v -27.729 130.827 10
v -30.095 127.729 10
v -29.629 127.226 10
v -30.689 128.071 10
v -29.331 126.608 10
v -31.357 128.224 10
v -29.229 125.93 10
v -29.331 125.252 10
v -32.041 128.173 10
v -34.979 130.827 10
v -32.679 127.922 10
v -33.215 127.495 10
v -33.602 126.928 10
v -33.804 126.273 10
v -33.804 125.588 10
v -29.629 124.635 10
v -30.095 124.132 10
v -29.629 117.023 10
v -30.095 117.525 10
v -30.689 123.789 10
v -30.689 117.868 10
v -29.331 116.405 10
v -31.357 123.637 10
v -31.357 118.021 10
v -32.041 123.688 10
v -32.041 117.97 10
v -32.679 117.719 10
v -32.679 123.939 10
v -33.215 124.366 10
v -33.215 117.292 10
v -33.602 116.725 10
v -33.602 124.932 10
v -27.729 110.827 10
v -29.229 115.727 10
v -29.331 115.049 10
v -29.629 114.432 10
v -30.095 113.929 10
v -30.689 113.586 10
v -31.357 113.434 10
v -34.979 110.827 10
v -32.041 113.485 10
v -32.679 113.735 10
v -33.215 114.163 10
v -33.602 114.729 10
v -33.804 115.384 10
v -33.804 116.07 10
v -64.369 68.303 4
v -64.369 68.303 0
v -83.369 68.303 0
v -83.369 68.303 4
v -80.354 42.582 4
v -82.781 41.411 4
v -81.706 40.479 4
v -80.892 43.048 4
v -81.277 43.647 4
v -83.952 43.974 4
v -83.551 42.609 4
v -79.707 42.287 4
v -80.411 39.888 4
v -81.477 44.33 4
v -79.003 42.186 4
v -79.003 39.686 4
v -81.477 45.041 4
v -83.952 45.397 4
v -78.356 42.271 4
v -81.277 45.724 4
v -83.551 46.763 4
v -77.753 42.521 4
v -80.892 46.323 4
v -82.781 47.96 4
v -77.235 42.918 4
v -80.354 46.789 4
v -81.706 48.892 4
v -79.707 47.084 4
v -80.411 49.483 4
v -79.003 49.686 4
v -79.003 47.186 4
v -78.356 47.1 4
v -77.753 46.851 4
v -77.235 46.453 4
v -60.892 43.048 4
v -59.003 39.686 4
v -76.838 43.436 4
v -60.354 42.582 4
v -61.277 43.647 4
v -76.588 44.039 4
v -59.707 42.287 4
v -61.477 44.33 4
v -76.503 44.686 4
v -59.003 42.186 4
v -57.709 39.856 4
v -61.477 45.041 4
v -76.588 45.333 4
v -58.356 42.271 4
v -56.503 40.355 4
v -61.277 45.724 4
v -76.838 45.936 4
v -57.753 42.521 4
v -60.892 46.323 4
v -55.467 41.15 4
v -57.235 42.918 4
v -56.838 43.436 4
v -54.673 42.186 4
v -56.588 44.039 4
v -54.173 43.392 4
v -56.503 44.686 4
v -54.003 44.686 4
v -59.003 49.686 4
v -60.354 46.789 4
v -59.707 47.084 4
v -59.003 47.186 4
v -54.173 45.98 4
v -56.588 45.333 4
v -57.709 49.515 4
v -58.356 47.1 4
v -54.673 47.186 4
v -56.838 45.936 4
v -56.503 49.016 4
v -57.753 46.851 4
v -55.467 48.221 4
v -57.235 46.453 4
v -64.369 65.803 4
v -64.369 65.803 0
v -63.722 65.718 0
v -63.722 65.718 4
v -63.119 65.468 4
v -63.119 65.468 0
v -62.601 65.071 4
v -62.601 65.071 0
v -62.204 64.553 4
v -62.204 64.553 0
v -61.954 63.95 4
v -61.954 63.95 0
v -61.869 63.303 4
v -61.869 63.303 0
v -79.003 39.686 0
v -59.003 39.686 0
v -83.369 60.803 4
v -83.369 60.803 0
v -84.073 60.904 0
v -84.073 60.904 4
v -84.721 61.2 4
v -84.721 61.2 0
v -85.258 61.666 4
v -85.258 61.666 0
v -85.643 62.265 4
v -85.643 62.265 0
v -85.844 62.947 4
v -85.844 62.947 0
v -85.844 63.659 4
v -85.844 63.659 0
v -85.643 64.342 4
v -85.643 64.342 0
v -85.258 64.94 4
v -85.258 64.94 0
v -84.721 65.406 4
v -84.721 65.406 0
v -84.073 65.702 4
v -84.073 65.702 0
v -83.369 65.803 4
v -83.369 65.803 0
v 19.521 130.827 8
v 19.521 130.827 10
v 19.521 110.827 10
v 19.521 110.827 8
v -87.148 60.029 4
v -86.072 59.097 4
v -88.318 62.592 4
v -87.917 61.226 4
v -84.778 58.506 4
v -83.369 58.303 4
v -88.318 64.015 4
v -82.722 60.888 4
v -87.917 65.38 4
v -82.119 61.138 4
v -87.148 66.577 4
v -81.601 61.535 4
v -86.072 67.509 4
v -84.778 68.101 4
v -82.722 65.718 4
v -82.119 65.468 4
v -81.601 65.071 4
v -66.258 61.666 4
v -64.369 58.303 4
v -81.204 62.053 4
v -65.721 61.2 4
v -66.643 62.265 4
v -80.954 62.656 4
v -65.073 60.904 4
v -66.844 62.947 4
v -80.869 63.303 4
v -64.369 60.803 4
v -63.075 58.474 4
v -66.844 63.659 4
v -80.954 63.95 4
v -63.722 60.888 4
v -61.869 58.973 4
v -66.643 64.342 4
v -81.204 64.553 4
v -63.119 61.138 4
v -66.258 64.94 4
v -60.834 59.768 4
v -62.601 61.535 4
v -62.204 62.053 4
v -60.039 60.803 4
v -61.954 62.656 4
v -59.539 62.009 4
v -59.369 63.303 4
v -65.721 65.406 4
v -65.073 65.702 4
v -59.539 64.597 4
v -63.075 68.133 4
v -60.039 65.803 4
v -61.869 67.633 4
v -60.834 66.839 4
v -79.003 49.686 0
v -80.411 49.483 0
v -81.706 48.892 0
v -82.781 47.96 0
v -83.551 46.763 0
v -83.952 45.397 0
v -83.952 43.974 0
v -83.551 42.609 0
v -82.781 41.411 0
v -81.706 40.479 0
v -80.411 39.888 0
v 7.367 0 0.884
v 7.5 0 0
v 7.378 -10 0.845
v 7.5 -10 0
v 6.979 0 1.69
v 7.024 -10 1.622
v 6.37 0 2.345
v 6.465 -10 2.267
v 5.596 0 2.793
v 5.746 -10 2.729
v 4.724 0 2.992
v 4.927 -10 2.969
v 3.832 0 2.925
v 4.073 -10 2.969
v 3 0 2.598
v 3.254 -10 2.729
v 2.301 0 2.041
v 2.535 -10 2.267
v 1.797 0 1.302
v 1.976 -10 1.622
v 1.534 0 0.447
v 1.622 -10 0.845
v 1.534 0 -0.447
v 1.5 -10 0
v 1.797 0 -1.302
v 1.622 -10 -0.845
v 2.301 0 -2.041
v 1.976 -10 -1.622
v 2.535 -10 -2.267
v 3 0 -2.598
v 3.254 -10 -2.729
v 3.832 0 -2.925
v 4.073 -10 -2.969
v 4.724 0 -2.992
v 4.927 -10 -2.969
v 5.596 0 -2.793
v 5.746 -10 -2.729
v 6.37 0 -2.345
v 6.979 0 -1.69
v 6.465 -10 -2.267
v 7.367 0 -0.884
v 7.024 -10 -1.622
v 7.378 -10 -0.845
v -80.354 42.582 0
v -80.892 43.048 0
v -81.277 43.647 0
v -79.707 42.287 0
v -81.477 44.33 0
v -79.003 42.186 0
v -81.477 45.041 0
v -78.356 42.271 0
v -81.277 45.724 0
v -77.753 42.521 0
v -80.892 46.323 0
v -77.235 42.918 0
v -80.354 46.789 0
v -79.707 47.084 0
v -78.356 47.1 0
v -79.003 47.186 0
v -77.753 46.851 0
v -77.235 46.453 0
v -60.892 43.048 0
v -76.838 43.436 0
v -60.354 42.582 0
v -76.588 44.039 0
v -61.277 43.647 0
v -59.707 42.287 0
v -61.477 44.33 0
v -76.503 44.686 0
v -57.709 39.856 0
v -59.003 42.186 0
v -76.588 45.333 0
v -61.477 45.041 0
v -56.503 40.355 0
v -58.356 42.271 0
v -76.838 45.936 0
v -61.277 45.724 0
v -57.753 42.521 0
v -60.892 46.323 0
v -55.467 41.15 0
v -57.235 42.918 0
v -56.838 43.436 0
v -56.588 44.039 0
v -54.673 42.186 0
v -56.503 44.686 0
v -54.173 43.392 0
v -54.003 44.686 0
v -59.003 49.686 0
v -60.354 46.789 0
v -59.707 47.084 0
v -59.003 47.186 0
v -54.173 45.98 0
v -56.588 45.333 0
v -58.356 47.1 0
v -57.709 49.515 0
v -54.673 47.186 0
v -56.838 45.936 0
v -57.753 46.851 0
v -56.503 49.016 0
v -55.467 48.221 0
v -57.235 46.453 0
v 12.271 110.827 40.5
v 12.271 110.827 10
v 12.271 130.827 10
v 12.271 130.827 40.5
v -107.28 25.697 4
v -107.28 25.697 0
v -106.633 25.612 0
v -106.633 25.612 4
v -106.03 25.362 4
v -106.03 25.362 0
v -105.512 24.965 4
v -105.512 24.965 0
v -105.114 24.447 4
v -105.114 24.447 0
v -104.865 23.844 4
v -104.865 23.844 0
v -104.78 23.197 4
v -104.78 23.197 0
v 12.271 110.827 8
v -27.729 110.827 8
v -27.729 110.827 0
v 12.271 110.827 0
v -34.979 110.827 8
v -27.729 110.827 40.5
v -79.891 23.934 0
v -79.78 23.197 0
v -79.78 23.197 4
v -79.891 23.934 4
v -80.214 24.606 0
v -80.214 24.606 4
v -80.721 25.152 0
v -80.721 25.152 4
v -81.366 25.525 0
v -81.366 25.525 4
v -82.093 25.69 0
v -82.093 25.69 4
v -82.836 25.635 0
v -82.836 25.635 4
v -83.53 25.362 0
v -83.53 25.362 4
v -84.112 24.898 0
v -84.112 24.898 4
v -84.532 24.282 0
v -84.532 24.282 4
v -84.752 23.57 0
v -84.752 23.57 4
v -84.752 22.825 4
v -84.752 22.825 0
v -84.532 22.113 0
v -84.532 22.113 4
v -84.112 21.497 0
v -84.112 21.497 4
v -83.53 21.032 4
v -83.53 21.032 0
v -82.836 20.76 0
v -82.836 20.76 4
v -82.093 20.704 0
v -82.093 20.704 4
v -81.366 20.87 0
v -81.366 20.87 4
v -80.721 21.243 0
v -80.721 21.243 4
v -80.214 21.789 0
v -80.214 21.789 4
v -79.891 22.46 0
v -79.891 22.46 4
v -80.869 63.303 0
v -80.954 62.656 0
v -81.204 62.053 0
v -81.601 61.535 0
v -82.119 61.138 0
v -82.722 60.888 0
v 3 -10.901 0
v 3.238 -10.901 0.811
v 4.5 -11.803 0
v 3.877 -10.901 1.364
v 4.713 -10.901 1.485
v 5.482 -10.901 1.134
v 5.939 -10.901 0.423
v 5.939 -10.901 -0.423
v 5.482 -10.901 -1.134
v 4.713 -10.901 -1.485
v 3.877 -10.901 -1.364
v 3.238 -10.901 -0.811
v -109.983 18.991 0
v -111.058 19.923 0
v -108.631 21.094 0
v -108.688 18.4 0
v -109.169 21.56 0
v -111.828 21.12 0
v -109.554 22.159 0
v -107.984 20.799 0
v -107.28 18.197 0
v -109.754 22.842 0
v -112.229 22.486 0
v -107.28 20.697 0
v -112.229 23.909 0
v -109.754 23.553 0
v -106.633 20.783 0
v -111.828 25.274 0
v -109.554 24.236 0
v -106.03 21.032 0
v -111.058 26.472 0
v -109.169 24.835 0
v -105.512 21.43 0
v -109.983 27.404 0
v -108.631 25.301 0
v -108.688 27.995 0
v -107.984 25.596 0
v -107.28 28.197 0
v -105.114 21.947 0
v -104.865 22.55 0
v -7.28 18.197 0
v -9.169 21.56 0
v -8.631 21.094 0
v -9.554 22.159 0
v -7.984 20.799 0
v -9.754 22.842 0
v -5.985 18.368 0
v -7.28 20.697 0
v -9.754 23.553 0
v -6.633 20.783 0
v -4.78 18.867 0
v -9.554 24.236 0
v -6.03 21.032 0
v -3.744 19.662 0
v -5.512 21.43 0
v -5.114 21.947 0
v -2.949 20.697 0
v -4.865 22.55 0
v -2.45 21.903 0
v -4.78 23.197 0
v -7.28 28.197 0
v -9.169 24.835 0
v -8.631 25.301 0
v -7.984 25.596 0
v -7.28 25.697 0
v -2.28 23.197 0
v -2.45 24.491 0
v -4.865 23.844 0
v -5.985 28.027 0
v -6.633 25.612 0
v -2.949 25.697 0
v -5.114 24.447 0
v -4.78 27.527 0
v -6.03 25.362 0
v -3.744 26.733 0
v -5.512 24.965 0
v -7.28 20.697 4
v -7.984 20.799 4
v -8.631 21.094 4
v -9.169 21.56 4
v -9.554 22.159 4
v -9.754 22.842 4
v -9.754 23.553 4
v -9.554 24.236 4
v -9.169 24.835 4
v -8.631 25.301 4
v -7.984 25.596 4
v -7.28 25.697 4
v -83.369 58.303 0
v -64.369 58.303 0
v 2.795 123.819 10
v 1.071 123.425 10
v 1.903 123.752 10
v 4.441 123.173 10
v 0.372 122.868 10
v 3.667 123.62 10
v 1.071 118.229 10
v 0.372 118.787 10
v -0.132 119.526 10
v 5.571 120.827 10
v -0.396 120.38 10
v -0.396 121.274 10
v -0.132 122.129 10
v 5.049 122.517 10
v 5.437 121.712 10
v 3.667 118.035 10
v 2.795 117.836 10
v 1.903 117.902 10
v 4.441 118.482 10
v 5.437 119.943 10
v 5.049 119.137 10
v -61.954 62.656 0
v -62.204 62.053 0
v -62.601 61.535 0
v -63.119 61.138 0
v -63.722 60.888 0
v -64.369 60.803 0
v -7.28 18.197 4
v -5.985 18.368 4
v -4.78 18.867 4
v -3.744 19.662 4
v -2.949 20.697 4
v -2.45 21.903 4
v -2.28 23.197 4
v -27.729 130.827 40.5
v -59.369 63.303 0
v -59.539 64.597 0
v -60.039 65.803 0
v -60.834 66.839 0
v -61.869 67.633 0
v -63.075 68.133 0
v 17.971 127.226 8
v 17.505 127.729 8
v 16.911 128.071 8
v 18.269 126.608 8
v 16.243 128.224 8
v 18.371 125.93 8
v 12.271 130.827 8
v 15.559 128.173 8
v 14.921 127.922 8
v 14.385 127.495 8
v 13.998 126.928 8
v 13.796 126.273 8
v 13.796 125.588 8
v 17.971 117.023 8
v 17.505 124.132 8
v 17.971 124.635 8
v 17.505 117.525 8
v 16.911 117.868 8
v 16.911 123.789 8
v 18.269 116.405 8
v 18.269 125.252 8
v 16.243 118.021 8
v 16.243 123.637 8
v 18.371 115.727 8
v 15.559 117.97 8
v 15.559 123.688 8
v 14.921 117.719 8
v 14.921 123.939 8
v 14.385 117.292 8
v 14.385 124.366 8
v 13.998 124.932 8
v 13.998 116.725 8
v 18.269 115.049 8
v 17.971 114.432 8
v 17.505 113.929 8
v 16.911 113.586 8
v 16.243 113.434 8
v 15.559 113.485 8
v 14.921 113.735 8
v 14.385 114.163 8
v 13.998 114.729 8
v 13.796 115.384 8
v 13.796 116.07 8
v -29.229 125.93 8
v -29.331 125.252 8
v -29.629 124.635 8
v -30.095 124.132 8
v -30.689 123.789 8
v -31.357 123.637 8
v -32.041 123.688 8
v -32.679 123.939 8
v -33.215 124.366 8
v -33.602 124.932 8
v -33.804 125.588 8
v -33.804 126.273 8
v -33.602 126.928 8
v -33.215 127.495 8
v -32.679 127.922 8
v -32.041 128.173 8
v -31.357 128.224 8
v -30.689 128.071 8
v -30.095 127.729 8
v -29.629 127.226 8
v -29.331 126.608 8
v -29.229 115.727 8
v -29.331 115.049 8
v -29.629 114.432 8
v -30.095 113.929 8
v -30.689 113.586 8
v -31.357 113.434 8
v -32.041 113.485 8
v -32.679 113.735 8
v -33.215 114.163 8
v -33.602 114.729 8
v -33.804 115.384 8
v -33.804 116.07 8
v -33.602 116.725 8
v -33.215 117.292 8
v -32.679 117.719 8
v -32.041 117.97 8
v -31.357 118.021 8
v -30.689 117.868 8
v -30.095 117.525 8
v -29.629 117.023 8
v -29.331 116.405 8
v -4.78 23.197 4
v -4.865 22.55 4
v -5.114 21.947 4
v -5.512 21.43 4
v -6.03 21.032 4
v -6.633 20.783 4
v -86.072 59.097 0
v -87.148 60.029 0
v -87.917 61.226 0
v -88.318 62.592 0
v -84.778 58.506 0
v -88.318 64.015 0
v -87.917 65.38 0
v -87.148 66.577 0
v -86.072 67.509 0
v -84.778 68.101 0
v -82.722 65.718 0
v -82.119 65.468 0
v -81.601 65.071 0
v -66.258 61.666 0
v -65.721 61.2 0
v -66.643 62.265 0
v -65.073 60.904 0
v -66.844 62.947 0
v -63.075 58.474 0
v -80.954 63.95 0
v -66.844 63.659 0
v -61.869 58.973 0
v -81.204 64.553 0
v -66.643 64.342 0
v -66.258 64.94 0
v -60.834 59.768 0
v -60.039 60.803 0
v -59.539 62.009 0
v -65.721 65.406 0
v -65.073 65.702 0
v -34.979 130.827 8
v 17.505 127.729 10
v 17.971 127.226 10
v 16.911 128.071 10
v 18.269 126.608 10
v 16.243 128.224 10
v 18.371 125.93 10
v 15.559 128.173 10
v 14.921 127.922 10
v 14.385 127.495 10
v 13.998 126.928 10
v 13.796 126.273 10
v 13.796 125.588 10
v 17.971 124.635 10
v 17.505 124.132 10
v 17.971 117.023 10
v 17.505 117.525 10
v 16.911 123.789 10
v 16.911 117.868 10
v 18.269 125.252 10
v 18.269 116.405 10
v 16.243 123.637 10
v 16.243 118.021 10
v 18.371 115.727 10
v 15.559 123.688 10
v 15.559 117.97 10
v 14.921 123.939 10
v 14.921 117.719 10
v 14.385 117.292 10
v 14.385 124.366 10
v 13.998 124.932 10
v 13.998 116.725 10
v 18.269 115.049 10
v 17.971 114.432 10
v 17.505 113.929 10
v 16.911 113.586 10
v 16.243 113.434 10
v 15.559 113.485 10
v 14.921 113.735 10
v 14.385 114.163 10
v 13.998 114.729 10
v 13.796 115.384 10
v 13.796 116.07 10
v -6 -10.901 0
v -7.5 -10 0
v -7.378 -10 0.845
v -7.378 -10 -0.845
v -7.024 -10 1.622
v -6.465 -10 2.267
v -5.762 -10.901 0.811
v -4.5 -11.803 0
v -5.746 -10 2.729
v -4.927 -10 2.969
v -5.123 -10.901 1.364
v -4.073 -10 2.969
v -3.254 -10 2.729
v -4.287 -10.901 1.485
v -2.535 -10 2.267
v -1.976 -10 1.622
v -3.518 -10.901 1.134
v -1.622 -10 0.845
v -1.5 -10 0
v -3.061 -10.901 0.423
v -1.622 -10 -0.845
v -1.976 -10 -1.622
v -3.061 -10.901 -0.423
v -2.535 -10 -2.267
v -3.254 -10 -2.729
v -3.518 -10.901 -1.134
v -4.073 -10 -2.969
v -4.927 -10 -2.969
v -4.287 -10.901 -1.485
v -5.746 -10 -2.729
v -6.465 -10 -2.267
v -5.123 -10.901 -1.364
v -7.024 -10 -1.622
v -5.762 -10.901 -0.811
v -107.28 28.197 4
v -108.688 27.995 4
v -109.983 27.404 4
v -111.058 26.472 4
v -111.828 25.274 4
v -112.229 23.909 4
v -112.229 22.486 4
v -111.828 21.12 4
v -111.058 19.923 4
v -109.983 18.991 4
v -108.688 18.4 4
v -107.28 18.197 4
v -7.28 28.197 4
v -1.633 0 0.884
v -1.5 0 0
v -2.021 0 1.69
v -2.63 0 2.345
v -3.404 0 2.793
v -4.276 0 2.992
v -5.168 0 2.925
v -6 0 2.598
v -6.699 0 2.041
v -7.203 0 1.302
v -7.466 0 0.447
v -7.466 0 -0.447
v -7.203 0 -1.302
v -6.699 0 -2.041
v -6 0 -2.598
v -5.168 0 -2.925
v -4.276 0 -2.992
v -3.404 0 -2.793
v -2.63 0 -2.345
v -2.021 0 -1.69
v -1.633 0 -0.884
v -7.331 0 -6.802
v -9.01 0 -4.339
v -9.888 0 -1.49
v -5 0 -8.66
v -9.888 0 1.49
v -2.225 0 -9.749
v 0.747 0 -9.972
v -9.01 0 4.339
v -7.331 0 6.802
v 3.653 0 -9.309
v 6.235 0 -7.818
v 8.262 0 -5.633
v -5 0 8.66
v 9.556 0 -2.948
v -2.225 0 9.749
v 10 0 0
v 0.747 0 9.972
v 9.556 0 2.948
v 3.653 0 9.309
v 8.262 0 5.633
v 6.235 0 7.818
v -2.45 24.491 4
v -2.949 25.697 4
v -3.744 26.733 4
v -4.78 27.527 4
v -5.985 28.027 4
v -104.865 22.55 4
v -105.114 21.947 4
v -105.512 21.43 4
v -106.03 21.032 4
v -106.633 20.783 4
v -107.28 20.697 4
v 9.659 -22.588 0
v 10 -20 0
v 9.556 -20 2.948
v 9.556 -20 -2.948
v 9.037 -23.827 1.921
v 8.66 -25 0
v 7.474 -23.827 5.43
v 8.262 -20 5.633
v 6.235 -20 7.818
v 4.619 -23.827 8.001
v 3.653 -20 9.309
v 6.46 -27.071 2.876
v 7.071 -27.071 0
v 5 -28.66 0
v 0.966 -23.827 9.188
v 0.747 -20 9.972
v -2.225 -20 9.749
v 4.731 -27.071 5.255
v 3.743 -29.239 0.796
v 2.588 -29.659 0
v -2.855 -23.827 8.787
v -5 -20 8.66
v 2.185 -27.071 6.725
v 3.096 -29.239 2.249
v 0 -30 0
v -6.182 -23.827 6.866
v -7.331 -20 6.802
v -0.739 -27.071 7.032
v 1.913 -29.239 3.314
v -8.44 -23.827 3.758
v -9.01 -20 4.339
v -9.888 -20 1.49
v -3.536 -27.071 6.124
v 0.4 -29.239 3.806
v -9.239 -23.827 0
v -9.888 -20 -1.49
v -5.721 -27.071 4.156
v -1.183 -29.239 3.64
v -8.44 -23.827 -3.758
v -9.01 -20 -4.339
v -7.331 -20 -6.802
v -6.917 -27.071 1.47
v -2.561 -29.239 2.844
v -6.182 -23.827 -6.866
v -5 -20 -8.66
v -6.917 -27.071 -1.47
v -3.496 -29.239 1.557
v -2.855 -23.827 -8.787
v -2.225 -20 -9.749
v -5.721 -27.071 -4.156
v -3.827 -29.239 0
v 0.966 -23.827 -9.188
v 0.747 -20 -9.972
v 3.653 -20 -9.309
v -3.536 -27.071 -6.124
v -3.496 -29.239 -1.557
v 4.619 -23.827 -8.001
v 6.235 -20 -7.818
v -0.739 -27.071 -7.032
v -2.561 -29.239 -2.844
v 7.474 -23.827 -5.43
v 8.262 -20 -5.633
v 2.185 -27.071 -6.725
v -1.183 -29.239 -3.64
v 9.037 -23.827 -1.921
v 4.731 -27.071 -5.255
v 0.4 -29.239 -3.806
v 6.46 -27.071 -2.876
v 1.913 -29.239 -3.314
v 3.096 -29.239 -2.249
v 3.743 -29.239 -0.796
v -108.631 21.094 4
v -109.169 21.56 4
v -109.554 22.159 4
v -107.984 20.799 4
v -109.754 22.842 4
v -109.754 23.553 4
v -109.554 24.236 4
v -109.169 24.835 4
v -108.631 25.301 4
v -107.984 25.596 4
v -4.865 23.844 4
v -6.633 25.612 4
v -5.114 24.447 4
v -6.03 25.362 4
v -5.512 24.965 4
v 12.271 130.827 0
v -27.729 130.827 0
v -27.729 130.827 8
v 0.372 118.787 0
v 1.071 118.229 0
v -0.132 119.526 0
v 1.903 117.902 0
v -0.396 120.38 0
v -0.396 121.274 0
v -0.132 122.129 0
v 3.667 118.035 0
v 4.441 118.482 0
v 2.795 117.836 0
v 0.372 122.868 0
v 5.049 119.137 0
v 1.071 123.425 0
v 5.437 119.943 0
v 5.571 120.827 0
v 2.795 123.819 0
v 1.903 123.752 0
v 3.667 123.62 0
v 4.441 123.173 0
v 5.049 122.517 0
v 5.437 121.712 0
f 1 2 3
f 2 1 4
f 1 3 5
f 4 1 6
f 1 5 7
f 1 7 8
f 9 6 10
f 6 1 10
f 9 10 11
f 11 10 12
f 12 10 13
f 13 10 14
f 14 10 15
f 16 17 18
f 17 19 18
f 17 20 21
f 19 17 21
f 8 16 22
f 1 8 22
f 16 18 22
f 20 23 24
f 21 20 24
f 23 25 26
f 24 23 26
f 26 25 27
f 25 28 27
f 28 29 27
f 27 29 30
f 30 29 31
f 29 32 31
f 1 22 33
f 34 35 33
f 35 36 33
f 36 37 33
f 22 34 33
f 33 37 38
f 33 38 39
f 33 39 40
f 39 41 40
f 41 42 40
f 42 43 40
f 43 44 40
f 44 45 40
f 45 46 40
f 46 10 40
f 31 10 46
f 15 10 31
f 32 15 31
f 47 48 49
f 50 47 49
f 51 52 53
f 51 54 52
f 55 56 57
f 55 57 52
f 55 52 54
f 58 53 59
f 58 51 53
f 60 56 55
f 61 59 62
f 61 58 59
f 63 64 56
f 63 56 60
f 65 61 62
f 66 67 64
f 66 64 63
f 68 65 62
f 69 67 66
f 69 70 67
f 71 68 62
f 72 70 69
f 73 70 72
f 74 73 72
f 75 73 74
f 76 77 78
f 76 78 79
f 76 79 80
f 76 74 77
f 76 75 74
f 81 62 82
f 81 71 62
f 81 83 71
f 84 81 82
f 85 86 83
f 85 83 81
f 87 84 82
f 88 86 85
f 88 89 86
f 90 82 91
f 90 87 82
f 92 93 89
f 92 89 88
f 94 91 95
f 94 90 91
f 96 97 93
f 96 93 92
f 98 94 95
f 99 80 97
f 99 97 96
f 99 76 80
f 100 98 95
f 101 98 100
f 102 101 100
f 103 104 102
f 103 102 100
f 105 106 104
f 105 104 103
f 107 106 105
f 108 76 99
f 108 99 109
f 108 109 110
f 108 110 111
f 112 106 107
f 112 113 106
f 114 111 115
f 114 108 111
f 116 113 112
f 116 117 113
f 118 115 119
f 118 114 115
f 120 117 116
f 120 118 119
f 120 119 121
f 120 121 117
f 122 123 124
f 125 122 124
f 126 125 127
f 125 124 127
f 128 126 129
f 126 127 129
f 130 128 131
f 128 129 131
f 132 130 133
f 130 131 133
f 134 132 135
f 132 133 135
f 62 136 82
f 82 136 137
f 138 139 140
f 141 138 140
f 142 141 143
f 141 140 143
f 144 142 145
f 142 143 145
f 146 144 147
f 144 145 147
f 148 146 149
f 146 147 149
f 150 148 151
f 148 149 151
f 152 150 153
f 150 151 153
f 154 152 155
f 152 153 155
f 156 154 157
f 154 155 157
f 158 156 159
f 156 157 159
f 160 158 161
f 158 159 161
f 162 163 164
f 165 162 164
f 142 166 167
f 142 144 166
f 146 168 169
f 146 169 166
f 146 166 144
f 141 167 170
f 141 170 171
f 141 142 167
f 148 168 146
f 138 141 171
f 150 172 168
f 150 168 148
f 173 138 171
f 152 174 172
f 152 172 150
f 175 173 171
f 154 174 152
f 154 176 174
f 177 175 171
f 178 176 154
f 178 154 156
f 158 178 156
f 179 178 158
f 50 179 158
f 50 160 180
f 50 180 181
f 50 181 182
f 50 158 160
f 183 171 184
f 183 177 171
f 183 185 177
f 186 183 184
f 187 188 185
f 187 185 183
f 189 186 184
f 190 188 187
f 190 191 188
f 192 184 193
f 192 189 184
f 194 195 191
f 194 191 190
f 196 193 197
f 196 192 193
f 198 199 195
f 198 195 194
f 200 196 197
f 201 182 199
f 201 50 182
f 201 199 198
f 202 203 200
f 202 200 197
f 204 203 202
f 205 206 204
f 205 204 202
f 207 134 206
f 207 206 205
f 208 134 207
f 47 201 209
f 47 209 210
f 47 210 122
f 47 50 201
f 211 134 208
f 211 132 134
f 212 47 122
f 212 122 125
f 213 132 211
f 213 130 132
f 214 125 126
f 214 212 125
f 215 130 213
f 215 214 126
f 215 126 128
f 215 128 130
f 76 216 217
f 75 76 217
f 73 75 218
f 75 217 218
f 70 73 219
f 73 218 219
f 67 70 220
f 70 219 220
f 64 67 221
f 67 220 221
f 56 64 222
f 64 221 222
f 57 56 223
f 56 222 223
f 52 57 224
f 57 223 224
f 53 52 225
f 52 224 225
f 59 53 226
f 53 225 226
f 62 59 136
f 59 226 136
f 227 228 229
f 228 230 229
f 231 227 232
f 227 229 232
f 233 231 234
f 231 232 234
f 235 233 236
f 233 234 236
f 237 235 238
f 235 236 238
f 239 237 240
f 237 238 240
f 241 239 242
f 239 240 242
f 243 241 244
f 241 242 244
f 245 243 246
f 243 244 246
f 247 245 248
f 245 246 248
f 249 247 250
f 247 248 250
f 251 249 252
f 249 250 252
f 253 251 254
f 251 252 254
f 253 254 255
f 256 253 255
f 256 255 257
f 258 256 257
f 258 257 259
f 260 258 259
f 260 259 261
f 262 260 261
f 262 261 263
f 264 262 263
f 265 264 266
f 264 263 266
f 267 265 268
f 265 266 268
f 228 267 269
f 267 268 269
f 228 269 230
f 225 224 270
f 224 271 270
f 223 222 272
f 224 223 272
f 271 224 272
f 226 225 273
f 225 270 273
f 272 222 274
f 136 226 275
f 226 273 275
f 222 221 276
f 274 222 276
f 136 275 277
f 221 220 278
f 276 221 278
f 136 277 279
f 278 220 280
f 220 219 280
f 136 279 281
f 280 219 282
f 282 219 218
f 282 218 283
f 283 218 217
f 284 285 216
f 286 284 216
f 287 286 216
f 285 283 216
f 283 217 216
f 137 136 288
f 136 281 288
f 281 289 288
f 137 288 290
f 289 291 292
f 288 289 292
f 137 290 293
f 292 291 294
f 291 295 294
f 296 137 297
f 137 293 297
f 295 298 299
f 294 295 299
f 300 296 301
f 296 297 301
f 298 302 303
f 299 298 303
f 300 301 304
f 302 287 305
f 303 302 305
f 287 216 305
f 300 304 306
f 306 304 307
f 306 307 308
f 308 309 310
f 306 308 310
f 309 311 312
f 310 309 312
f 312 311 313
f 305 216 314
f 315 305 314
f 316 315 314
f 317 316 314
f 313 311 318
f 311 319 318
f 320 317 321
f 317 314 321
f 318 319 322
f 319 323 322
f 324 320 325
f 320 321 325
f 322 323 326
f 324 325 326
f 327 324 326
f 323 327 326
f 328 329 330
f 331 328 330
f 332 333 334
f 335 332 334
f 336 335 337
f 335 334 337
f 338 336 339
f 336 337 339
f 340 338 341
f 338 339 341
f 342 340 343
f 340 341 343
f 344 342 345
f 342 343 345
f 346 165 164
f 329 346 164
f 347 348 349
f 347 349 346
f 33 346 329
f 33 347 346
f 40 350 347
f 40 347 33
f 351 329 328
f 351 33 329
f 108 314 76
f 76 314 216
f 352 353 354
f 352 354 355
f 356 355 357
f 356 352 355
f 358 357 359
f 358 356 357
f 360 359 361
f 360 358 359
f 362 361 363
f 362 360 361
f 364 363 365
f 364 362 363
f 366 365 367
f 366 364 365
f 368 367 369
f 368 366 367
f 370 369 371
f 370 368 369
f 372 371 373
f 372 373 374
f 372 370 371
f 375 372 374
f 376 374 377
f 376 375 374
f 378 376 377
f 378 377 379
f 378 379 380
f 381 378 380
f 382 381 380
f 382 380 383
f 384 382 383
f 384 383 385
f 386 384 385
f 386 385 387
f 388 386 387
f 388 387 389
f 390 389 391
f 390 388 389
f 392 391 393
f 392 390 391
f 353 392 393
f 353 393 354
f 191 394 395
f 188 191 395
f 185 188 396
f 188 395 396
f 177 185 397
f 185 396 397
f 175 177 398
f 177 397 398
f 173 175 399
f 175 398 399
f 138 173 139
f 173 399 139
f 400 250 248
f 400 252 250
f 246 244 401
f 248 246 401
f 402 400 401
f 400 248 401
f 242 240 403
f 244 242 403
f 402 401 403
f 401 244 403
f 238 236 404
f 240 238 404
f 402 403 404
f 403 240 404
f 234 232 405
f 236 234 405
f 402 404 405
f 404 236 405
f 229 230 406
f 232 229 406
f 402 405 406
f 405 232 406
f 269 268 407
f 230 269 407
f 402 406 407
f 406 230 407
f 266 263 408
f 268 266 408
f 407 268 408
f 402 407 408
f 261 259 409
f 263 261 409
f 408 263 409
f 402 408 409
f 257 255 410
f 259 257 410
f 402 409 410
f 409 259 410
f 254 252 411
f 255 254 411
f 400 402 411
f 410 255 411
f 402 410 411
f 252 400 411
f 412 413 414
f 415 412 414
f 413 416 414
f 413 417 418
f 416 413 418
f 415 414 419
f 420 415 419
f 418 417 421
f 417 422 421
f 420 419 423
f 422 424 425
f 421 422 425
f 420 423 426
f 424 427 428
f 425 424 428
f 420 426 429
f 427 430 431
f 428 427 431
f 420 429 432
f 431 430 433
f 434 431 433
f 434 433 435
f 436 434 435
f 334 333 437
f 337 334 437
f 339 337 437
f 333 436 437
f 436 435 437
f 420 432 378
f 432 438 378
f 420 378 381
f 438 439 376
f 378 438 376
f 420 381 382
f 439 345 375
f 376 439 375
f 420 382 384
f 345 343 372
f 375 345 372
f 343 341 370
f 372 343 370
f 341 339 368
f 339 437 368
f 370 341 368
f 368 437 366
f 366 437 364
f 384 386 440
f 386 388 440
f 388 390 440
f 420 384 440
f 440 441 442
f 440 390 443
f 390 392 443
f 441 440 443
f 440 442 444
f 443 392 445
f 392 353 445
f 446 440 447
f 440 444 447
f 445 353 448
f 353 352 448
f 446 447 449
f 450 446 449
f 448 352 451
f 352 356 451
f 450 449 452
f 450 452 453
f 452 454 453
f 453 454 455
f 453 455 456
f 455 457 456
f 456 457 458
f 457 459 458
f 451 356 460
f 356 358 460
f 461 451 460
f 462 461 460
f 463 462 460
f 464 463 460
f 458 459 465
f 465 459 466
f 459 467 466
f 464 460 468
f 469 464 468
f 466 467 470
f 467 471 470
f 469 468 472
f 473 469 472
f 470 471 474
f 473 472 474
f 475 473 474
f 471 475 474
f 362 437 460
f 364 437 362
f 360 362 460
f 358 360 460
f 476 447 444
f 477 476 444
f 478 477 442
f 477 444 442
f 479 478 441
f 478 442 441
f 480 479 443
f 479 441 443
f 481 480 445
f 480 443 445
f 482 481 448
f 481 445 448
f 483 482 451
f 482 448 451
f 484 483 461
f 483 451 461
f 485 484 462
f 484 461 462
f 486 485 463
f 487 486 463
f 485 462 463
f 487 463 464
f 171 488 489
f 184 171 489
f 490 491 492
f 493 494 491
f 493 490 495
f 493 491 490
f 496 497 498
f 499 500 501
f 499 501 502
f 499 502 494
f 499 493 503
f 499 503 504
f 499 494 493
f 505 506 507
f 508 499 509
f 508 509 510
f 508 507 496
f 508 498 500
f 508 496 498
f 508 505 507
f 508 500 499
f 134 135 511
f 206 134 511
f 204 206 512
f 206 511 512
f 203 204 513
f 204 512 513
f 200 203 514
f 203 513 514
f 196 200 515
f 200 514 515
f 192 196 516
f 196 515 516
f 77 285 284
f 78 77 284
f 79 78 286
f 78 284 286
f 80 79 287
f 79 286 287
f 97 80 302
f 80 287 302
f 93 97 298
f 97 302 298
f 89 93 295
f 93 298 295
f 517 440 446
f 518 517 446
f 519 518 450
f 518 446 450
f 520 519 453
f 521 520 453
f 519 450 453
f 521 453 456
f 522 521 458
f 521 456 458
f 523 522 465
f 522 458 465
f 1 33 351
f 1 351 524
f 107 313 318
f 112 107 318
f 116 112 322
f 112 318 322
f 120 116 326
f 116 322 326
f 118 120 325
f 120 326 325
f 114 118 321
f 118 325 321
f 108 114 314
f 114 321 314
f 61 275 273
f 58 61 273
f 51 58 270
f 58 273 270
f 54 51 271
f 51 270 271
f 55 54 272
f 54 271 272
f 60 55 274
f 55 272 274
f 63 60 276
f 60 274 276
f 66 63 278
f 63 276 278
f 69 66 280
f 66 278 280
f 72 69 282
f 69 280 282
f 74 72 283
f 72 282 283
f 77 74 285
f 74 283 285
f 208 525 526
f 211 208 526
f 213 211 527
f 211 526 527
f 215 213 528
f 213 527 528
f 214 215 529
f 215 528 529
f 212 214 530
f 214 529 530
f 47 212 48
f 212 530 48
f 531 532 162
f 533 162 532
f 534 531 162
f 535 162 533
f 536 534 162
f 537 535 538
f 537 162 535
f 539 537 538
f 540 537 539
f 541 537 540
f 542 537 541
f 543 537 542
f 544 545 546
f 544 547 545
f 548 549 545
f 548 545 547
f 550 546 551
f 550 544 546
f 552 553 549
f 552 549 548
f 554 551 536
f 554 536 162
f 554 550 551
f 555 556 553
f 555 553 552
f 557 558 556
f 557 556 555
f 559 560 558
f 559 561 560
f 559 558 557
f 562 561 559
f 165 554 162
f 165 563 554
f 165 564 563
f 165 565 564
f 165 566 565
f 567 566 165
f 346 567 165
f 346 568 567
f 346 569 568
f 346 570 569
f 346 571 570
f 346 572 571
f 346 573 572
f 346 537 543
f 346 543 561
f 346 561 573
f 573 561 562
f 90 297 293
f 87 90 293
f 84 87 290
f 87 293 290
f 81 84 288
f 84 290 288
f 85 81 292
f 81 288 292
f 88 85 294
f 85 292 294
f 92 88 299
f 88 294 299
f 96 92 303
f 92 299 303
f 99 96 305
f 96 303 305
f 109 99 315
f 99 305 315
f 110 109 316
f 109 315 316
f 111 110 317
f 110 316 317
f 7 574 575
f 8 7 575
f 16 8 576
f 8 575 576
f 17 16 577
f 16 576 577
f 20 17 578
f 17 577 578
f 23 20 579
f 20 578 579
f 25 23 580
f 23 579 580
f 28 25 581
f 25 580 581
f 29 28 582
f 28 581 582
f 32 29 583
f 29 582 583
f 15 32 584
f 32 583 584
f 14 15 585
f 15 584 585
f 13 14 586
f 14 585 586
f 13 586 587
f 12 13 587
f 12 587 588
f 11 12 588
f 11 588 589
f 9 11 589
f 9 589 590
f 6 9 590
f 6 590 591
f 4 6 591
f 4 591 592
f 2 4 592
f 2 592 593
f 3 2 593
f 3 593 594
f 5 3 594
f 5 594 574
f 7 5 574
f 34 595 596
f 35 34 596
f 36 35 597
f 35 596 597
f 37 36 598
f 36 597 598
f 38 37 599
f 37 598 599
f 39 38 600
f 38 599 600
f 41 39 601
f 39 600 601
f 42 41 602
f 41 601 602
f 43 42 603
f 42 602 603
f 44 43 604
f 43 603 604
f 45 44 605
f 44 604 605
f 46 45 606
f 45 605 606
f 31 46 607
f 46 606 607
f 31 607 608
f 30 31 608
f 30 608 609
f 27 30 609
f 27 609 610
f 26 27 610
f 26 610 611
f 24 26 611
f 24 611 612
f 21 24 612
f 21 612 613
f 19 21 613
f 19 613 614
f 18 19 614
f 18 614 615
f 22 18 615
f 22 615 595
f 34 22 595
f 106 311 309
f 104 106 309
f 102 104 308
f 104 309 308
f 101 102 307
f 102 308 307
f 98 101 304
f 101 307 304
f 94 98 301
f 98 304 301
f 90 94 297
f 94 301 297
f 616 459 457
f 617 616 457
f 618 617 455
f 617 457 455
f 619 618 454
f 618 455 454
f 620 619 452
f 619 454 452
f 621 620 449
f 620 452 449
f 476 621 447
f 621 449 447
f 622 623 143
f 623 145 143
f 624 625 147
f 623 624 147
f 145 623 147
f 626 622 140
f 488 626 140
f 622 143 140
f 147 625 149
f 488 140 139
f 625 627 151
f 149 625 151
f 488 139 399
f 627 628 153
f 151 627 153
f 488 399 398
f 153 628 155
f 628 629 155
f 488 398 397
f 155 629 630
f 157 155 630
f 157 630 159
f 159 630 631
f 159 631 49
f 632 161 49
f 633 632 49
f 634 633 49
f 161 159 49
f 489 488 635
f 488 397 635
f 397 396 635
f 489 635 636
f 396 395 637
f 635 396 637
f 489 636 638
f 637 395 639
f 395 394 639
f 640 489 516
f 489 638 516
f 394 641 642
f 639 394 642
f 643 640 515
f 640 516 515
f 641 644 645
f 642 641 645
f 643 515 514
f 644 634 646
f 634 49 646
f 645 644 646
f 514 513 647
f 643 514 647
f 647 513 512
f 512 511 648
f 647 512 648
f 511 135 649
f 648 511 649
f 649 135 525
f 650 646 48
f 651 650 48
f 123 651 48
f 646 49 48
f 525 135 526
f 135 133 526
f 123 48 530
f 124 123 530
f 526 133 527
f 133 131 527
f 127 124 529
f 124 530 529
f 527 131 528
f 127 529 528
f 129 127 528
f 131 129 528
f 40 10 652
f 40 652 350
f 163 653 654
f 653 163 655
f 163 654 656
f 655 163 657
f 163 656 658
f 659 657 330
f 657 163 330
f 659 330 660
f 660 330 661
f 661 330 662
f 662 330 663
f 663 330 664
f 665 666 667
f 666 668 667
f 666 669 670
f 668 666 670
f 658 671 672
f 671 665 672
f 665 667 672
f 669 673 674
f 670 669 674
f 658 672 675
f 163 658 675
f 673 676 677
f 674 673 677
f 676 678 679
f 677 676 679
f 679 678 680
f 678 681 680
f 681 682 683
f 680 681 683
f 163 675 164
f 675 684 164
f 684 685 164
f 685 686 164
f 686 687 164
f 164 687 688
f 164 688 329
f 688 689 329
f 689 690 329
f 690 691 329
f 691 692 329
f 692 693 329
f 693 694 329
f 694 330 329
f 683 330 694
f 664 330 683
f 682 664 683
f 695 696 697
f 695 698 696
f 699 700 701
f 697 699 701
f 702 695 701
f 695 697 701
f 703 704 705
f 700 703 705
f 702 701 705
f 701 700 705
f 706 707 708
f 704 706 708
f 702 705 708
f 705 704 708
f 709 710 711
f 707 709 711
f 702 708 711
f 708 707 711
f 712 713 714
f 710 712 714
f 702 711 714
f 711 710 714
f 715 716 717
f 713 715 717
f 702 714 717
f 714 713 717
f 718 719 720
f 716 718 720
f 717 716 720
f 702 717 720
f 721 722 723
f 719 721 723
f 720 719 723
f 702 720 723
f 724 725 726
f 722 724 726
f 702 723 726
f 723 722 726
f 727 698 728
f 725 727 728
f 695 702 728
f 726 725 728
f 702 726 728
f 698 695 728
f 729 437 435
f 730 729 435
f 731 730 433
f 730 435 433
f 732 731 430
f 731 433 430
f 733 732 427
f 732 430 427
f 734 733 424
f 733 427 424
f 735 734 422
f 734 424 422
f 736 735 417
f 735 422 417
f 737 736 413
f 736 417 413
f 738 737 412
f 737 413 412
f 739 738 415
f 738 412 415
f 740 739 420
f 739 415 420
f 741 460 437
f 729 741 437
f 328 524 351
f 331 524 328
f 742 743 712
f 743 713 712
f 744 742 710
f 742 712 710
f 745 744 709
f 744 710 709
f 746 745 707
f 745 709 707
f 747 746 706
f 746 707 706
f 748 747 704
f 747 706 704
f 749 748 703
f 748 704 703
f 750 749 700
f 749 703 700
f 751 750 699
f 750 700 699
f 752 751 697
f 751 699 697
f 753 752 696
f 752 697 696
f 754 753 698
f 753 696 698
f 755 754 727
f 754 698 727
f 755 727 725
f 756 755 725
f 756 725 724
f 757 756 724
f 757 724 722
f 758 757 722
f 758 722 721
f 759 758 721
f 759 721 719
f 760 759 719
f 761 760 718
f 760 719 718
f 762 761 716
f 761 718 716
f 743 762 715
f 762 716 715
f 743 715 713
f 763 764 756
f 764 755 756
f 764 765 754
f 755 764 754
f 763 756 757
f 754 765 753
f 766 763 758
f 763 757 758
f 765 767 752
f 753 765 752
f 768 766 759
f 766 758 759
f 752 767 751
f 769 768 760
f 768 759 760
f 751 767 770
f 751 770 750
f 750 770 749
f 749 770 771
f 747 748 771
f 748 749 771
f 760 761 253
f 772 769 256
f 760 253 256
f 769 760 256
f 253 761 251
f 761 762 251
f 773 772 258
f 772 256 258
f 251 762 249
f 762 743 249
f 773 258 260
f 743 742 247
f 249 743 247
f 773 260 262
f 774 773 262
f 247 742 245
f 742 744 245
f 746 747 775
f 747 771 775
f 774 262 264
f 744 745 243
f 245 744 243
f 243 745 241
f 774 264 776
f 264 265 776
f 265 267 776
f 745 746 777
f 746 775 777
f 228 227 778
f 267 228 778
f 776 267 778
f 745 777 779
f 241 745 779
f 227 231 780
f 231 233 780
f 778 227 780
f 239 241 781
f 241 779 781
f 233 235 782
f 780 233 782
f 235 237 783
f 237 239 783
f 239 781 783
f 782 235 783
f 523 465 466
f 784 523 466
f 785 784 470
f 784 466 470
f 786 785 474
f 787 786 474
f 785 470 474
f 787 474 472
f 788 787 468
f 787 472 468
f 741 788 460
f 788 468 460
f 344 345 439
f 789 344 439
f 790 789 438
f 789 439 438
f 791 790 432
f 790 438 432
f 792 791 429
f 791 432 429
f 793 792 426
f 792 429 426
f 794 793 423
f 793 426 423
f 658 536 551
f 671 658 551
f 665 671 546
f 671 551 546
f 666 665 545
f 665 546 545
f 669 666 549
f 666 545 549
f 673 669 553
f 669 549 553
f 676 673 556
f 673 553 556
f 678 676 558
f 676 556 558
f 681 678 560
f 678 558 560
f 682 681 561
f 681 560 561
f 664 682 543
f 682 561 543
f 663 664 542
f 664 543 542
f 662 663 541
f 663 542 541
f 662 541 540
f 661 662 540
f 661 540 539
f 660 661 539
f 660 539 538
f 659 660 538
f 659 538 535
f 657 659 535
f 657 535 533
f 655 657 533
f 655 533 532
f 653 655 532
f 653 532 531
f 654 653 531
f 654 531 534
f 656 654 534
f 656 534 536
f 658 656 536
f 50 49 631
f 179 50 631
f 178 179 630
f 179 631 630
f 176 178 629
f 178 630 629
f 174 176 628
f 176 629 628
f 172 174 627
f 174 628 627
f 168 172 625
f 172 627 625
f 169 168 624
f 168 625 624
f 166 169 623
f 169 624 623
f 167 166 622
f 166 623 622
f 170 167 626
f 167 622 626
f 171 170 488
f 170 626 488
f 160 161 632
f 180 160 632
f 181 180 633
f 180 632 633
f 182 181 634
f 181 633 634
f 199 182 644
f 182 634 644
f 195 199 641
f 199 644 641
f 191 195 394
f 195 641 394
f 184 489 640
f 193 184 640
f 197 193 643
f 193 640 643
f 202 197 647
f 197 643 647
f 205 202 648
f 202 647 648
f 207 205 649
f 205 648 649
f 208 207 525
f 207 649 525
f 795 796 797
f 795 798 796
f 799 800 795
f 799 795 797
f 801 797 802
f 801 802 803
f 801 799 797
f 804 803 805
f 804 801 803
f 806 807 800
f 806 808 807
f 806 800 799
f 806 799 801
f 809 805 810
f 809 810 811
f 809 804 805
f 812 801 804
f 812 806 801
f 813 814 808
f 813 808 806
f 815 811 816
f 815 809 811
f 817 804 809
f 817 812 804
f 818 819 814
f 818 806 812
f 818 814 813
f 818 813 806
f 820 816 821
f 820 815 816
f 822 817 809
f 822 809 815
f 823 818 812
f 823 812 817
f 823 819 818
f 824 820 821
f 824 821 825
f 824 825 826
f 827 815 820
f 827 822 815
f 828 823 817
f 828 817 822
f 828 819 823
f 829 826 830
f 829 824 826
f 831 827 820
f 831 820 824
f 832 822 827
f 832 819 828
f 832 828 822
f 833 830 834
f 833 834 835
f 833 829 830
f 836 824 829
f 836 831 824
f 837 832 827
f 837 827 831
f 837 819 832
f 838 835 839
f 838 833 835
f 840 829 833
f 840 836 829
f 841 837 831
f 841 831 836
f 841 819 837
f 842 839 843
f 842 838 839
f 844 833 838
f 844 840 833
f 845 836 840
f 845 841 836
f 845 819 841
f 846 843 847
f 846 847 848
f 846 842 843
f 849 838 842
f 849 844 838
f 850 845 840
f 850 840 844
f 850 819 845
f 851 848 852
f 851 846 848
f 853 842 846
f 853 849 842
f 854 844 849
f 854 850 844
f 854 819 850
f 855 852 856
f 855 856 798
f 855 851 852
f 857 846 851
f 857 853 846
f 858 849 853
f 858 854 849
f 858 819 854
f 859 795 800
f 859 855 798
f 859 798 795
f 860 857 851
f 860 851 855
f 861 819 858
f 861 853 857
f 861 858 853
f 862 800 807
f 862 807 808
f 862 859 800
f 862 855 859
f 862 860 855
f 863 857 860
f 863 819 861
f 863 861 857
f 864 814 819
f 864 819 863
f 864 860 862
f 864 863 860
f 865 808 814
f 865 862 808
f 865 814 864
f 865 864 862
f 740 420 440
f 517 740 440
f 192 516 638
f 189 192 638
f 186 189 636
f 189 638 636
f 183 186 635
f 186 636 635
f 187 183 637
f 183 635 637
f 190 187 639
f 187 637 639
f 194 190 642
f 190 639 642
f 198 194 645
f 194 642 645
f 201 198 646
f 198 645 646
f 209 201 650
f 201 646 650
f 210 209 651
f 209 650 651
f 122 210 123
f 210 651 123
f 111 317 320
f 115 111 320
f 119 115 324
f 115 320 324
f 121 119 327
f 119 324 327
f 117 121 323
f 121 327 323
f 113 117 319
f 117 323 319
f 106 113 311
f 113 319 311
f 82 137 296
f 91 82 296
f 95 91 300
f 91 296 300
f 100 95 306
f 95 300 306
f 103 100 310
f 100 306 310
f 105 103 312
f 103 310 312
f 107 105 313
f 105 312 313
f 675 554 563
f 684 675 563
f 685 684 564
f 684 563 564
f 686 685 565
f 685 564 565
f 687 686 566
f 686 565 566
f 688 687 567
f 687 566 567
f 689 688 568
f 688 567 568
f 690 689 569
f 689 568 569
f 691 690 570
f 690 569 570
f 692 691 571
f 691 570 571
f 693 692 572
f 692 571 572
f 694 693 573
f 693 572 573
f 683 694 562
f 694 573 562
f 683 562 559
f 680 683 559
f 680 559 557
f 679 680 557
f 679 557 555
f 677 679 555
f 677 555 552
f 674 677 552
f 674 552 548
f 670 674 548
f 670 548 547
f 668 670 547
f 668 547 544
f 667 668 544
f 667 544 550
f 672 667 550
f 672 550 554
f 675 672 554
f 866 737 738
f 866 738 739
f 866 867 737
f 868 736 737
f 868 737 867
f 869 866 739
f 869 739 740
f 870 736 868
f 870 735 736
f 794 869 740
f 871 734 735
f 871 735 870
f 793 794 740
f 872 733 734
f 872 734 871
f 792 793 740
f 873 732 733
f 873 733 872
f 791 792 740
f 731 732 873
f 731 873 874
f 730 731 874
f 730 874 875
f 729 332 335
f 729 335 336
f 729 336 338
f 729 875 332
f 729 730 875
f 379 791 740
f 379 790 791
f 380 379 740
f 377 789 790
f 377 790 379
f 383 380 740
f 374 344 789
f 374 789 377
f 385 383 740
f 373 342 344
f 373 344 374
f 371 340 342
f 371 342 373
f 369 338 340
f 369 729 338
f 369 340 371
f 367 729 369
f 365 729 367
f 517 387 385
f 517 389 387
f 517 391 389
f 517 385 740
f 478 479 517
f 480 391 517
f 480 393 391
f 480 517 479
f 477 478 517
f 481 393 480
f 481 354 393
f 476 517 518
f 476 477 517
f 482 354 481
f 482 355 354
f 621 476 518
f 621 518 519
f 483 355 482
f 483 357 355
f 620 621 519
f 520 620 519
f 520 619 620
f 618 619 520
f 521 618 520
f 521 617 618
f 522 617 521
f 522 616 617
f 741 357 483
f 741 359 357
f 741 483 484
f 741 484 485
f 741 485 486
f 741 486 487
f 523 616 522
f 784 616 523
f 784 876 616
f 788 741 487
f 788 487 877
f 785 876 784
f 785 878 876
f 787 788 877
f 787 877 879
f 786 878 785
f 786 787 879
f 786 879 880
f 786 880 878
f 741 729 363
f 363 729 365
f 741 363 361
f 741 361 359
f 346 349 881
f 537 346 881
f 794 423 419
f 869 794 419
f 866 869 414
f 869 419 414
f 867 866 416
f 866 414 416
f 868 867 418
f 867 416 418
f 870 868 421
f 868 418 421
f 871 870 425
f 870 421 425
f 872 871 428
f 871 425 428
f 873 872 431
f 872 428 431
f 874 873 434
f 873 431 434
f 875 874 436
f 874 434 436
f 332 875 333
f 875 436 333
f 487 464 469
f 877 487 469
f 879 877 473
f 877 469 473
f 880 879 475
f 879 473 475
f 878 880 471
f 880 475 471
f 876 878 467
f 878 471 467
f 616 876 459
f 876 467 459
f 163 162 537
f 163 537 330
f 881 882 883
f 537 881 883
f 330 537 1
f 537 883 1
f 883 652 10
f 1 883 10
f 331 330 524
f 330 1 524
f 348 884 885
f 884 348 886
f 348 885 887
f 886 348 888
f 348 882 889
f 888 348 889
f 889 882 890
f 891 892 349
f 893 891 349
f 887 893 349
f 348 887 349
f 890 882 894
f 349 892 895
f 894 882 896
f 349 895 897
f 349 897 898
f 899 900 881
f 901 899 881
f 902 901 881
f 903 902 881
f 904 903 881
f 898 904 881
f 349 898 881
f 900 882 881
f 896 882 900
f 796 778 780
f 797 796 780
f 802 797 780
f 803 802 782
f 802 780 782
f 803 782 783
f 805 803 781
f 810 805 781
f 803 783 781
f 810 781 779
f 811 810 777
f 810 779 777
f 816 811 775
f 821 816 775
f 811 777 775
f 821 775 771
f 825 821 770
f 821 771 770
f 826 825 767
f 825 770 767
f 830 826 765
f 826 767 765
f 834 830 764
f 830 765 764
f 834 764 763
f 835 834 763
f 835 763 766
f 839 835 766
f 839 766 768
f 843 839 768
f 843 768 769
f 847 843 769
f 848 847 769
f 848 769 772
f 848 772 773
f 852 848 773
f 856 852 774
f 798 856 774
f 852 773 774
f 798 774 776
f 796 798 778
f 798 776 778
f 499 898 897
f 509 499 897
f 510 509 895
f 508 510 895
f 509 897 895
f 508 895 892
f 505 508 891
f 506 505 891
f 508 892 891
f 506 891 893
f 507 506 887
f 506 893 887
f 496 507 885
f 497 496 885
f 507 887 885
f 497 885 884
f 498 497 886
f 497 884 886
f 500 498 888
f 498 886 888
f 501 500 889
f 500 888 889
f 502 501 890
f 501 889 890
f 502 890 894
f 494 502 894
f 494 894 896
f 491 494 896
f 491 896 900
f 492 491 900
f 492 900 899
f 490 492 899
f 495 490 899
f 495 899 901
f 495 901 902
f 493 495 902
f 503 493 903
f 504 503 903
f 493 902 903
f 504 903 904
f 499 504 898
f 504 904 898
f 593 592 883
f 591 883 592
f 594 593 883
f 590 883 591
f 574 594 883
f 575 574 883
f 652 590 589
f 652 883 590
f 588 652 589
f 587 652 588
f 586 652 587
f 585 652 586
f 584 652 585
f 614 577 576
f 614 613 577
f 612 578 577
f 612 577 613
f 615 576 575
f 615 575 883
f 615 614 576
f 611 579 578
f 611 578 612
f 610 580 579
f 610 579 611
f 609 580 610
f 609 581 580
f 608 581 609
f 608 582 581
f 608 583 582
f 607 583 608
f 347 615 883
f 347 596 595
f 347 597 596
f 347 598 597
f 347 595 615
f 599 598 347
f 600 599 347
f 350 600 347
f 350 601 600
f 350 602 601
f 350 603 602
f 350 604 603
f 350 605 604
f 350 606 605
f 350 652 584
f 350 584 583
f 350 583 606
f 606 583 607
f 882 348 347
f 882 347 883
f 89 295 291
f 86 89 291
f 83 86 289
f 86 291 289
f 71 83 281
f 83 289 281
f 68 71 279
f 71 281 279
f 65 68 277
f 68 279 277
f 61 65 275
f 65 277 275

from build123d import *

# Parameters (mm, degrees)
F0_R      = 10
F1_DEPTH  = 30
F2_R      = 10
F4_D      = 6
F4_DEPTH  = 10
F4_TIP    = 1.8025818571
F7_W      = 40
F7_H      = 20
F8_DEPTH  = 40.5
F10_W     = 20
F10_H     = 2
F11_DEPTH = 27.25
F12_R     = 3
F13_DEPTH = 10
F14_R     = 2.3
F15_DEPTH = 3
F17_DEPTH = 4
F18_R     = 2.5
F19_DEPTH = 4
F21_DEPTH = 4


with BuildPart() as f1:
    # F0 (on Front) → F1 (new body)
    with BuildSketch(Plane.XZ):
        Circle(F0_R)
    extrude(amount=F1_DEPTH)

    # F2
    f2_edges = [f1.edges().sort_by_distance(p)[0] for p in [
        (-10, -30, 0),
    ]]
    fillet(f2_edges, radius=F2_R)

    # F4
    with Locations(Plane(origin=(0, 0, 0), x_dir=(-1, 0, 0), z_dir=(0, 1, 0))):
        with Locations((-4.5, 0), (4.5, 0)):
            Hole(F4_D / 2, depth=F4_DEPTH)
            with Locations((0, 0, -(F4_DEPTH + F4_TIP / 2))):  # 118° drill point
                Cone(0, F4_D / 2, F4_TIP, mode=Mode.SUBTRACT)


with BuildPart() as f8:
    # F7 (on Top) → F8 (new body)
    with BuildSketch(Plane.XY):
        with Locations((-7.7292732894, 120.8272636564)):
            Rectangle(F7_W, F7_H)
    extrude(amount=F8_DEPTH)

    # F10 (on offset) → F11 (join, symmetric)
    with BuildSketch(Plane(origin=(-7.7292732894, 0, 0), x_dir=(0, -1, 0), z_dir=(-1, 0, 0))):
        with Locations((-120.8272636564, 9)):
            Rectangle(F10_W, F10_H)
    extrude(amount=F11_DEPTH, both=True)

    # F12 (on face) → F13 (cut)
    with BuildSketch(Plane(origin=(0, 0, 0), x_dir=(1, 0, 0), z_dir=(0, 0, -1))):
        with Locations((2.5707267106, -120.8272636564)):
            Circle(F12_R)
    extrude(amount=-F13_DEPTH, mode=Mode.SUBTRACT)

    # F14 (on face) → F15 (cut)
    with BuildSketch(Plane(origin=(0, 0, 8), x_dir=(1, 0, 0), z_dir=(0, 0, -1))):
        with Locations((16.0707267106, -115.7272636564)):
            Circle(F14_R)
        with Locations((16.0707267106, -125.9303896535)):
            Circle(F14_R)
        with Locations((-31.5292732894, -125.9303896535)):
            Circle(F14_R)
        with Locations((-31.5292732894, -115.7272636564)):
            Circle(F14_R)
    extrude(amount=-F15_DEPTH, mode=Mode.SUBTRACT)


with BuildPart() as f17:
    # F16 (on Top) → F17 (new body)
    with BuildSketch(Plane.XY):
        with BuildLine():
            ThreePointArc((-79.0027027001, 39.6855981151), (-75.4671687942, 41.1500642091), (-74.0027027001, 44.6855981151))
            ThreePointArc((-74.0027027001, 44.6855981151), (-75.4671687942, 48.221132021), (-79.0027027001, 49.6855981151))
            Line((-79.0027027001, 49.6855981151), (-79.0027027001, 47.1855981151))
            ThreePointArc((-79.0027027001, 47.1855981151), (-77.2349357472, 46.453365068), (-76.5027027001, 44.6855981151))
            ThreePointArc((-76.5027027001, 44.6855981151), (-77.2349357472, 42.9178311621), (-79.0027027001, 42.1855981151))
            Line((-79.0027027001, 42.1855981151), (-79.0027027001, 39.6855981151))
        make_face()
        with BuildLine():
            ThreePointArc((-79.0027027001, 49.6855981151), (-75.4671687942, 48.221132021), (-74.0027027001, 44.6855981151))
            ThreePointArc((-74.0027027001, 44.6855981151), (-75.4671687942, 41.1500642091), (-79.0027027001, 39.6855981151))
            Line((-79.0027027001, 39.6855981151), (-59.0027027001, 39.6855981151))
            ThreePointArc((-59.0027027001, 39.6855981151), (-64.0027027001, 44.6855981151), (-59.0027027001, 49.6855981151))
            Line((-59.0027027001, 49.6855981151), (-79.0027027001, 49.6855981151))
        make_face()
        with BuildLine():
            Line((-79.0027027001, 47.1855981151), (-79.0027027001, 49.6855981151))
            ThreePointArc((-79.0027027001, 49.6855981151), (-84.0027027001, 44.6855981151), (-79.0027027001, 39.6855981151))
            Line((-79.0027027001, 39.6855981151), (-79.0027027001, 42.1855981151))
            ThreePointArc((-79.0027027001, 42.1855981151), (-81.5027027001, 44.6855981151), (-79.0027027001, 47.1855981151))
        make_face()
        with BuildLine():
            ThreePointArc((-54.0027027001, 44.6855981151), (-55.4671687942, 48.221132021), (-59.0027027001, 49.6855981151))
            Line((-59.0027027001, 49.6855981151), (-59.0027027001, 47.1855981151))
            ThreePointArc((-59.0027027001, 47.1855981151), (-57.2349357472, 46.453365068), (-56.5027027001, 44.6855981151))
            ThreePointArc((-56.5027027001, 44.6855981151), (-57.2349357472, 42.9178311621), (-59.0027027001, 42.1855981151))
            Line((-59.0027027001, 42.1855981151), (-59.0027027001, 39.6855981151))
            ThreePointArc((-59.0027027001, 39.6855981151), (-55.4671687942, 41.1500642091), (-54.0027027001, 44.6855981151))
        make_face()
        with BuildLine():
            Line((-59.0027027001, 47.1855981151), (-59.0027027001, 49.6855981151))
            ThreePointArc((-59.0027027001, 49.6855981151), (-64.0027027001, 44.6855981151), (-59.0027027001, 39.6855981151))
            Line((-59.0027027001, 39.6855981151), (-59.0027027001, 42.1855981151))
            ThreePointArc((-59.0027027001, 42.1855981151), (-61.5027027001, 44.6855981151), (-59.0027027001, 47.1855981151))
        make_face()
    extrude(amount=F17_DEPTH)


with BuildPart() as f19:
    # F18 (on Top) → F19 (new body)
    with BuildSketch(Plane.XY):
        with BuildLine():
            ThreePointArc((-107.2795514017, 18.1973667862), (-103.7440174958, 19.6618328803), (-102.2795514017, 23.1973667862))
            ThreePointArc((-102.2795514017, 23.1973667862), (-103.7440174958, 26.7329006921), (-107.2795514017, 28.1973667862))
            Line((-107.2795514017, 28.1973667862), (-107.2795514017, 25.6973667862))
            ThreePointArc((-107.2795514017, 25.6973667862), (-105.5117844488, 24.9651337392), (-104.7795514017, 23.1973667862))
            ThreePointArc((-104.7795514017, 23.1973667862), (-105.5117844488, 21.4295998332), (-107.2795514017, 20.6973667862))
            Line((-107.2795514017, 20.6973667862), (-107.2795514017, 18.1973667862))
        make_face()
        with BuildLine():
            ThreePointArc((-107.2795514017, 28.1973667862), (-103.7440174958, 26.7329006921), (-102.2795514017, 23.1973667862))
            ThreePointArc((-102.2795514017, 23.1973667862), (-103.7440174958, 19.6618328803), (-107.2795514017, 18.1973667862))
            Line((-107.2795514017, 18.1973667862), (-7.2795514017, 18.1973667862))
            ThreePointArc((-7.2795514017, 18.1973667862), (-12.2795514017, 23.1973667862), (-7.2795514017, 28.1973667862))
            Line((-7.2795514017, 28.1973667862), (-107.2795514017, 28.1973667862))
        make_face()
        with Locations((-82.2795514017, 23.1973667862)):
            Circle(F18_R, mode=Mode.SUBTRACT)
        with BuildLine():
            Line((-107.2795514017, 25.6973667862), (-107.2795514017, 28.1973667862))
            ThreePointArc((-107.2795514017, 28.1973667862), (-112.2795514017, 23.1973667862), (-107.2795514017, 18.1973667862))
            Line((-107.2795514017, 18.1973667862), (-107.2795514017, 20.6973667862))
            ThreePointArc((-107.2795514017, 20.6973667862), (-109.7795514017, 23.1973667862), (-107.2795514017, 25.6973667862))
        make_face()
        with BuildLine():
            ThreePointArc((-2.2795514017, 23.1973667862), (-3.7440174958, 26.7329006921), (-7.2795514017, 28.1973667862))
            Line((-7.2795514017, 28.1973667862), (-7.2795514017, 25.6973667862))
            ThreePointArc((-7.2795514017, 25.6973667862), (-5.5117844488, 24.9651337392), (-4.7795514017, 23.1973667862))
            ThreePointArc((-4.7795514017, 23.1973667862), (-5.5117844488, 21.4295998332), (-7.2795514017, 20.6973667862))
            Line((-7.2795514017, 20.6973667862), (-7.2795514017, 18.1973667862))
            ThreePointArc((-7.2795514017, 18.1973667862), (-3.7440174958, 19.6618328803), (-2.2795514017, 23.1973667862))
        make_face()
        with BuildLine():
            Line((-7.2795514017, 25.6973667862), (-7.2795514017, 28.1973667862))
            ThreePointArc((-7.2795514017, 28.1973667862), (-12.2795514017, 23.1973667862), (-7.2795514017, 18.1973667862))
            Line((-7.2795514017, 18.1973667862), (-7.2795514017, 20.6973667862))
            ThreePointArc((-7.2795514017, 20.6973667862), (-9.7795514017, 23.1973667862), (-7.2795514017, 25.6973667862))
        make_face()
    extrude(amount=F19_DEPTH)


with BuildPart() as f21:
    # F20 (on Top) → F21 (new body)
    with BuildSketch(Plane.XY):
        with BuildLine():
            ThreePointArc((-83.3691260087, 58.3031725883), (-79.8335921028, 59.7676386824), (-78.3691260087, 63.3031725883))
            ThreePointArc((-78.3691260087, 63.3031725883), (-79.8335921028, 66.8387064943), (-83.3691260087, 68.3031725883))
            Line((-83.3691260087, 68.3031725883), (-83.3691260087, 65.8031725883))
            ThreePointArc((-83.3691260087, 65.8031725883), (-81.6013590558, 65.0709395413), (-80.8691260087, 63.3031725883))
            ThreePointArc((-80.8691260087, 63.3031725883), (-81.6013590558, 61.5354056354), (-83.3691260087, 60.8031725883))
            Line((-83.3691260087, 60.8031725883), (-83.3691260087, 58.3031725883))
        make_face()
        with BuildLine():
            ThreePointArc((-83.3691260087, 68.3031725883), (-79.8335921028, 66.8387064943), (-78.3691260087, 63.3031725883))
            ThreePointArc((-78.3691260087, 63.3031725883), (-79.8335921028, 59.7676386824), (-83.3691260087, 58.3031725883))
            Line((-83.3691260087, 58.3031725883), (-64.3691260087, 58.3031725883))
            ThreePointArc((-64.3691260087, 58.3031725883), (-69.3691260087, 63.3031725883), (-64.3691260087, 68.3031725883))
            Line((-64.3691260087, 68.3031725883), (-83.3691260087, 68.3031725883))
        make_face()
        with BuildLine():
            Line((-83.3691260087, 65.8031725883), (-83.3691260087, 68.3031725883))
            ThreePointArc((-83.3691260087, 68.3031725883), (-88.3691260087, 63.3031725883), (-83.3691260087, 58.3031725883))
            Line((-83.3691260087, 58.3031725883), (-83.3691260087, 60.8031725883))
            ThreePointArc((-83.3691260087, 60.8031725883), (-85.8691260087, 63.3031725883), (-83.3691260087, 65.8031725883))
        make_face()
        with BuildLine():
            Line((-64.3691260087, 65.8031725883), (-64.3691260087, 68.3031725883))
            ThreePointArc((-64.3691260087, 68.3031725883), (-69.3691260087, 63.3031725883), (-64.3691260087, 58.3031725883))
            Line((-64.3691260087, 58.3031725883), (-64.3691260087, 60.8031725883))
            ThreePointArc((-64.3691260087, 60.8031725883), (-66.8691260087, 63.3031725883), (-64.3691260087, 65.8031725883))
        make_face()
        with BuildLine():
            ThreePointArc((-59.3691260087, 63.3031725883), (-60.8335921028, 66.8387064943), (-64.3691260087, 68.3031725883))
            Line((-64.3691260087, 68.3031725883), (-64.3691260087, 65.8031725883))
            ThreePointArc((-64.3691260087, 65.8031725883), (-62.6013590558, 65.0709395413), (-61.8691260087, 63.3031725883))
            ThreePointArc((-61.8691260087, 63.3031725883), (-62.6013590558, 61.5354056354), (-64.3691260087, 60.8031725883))
            Line((-64.3691260087, 60.8031725883), (-64.3691260087, 58.3031725883))
            ThreePointArc((-64.3691260087, 58.3031725883), (-60.8335921028, 59.7676386824), (-59.3691260087, 63.3031725883))
        make_face()
    extrude(amount=F21_DEPTH)


solid = Compound([f1.part, f8.part, f17.part, f19.part, f21.part])
